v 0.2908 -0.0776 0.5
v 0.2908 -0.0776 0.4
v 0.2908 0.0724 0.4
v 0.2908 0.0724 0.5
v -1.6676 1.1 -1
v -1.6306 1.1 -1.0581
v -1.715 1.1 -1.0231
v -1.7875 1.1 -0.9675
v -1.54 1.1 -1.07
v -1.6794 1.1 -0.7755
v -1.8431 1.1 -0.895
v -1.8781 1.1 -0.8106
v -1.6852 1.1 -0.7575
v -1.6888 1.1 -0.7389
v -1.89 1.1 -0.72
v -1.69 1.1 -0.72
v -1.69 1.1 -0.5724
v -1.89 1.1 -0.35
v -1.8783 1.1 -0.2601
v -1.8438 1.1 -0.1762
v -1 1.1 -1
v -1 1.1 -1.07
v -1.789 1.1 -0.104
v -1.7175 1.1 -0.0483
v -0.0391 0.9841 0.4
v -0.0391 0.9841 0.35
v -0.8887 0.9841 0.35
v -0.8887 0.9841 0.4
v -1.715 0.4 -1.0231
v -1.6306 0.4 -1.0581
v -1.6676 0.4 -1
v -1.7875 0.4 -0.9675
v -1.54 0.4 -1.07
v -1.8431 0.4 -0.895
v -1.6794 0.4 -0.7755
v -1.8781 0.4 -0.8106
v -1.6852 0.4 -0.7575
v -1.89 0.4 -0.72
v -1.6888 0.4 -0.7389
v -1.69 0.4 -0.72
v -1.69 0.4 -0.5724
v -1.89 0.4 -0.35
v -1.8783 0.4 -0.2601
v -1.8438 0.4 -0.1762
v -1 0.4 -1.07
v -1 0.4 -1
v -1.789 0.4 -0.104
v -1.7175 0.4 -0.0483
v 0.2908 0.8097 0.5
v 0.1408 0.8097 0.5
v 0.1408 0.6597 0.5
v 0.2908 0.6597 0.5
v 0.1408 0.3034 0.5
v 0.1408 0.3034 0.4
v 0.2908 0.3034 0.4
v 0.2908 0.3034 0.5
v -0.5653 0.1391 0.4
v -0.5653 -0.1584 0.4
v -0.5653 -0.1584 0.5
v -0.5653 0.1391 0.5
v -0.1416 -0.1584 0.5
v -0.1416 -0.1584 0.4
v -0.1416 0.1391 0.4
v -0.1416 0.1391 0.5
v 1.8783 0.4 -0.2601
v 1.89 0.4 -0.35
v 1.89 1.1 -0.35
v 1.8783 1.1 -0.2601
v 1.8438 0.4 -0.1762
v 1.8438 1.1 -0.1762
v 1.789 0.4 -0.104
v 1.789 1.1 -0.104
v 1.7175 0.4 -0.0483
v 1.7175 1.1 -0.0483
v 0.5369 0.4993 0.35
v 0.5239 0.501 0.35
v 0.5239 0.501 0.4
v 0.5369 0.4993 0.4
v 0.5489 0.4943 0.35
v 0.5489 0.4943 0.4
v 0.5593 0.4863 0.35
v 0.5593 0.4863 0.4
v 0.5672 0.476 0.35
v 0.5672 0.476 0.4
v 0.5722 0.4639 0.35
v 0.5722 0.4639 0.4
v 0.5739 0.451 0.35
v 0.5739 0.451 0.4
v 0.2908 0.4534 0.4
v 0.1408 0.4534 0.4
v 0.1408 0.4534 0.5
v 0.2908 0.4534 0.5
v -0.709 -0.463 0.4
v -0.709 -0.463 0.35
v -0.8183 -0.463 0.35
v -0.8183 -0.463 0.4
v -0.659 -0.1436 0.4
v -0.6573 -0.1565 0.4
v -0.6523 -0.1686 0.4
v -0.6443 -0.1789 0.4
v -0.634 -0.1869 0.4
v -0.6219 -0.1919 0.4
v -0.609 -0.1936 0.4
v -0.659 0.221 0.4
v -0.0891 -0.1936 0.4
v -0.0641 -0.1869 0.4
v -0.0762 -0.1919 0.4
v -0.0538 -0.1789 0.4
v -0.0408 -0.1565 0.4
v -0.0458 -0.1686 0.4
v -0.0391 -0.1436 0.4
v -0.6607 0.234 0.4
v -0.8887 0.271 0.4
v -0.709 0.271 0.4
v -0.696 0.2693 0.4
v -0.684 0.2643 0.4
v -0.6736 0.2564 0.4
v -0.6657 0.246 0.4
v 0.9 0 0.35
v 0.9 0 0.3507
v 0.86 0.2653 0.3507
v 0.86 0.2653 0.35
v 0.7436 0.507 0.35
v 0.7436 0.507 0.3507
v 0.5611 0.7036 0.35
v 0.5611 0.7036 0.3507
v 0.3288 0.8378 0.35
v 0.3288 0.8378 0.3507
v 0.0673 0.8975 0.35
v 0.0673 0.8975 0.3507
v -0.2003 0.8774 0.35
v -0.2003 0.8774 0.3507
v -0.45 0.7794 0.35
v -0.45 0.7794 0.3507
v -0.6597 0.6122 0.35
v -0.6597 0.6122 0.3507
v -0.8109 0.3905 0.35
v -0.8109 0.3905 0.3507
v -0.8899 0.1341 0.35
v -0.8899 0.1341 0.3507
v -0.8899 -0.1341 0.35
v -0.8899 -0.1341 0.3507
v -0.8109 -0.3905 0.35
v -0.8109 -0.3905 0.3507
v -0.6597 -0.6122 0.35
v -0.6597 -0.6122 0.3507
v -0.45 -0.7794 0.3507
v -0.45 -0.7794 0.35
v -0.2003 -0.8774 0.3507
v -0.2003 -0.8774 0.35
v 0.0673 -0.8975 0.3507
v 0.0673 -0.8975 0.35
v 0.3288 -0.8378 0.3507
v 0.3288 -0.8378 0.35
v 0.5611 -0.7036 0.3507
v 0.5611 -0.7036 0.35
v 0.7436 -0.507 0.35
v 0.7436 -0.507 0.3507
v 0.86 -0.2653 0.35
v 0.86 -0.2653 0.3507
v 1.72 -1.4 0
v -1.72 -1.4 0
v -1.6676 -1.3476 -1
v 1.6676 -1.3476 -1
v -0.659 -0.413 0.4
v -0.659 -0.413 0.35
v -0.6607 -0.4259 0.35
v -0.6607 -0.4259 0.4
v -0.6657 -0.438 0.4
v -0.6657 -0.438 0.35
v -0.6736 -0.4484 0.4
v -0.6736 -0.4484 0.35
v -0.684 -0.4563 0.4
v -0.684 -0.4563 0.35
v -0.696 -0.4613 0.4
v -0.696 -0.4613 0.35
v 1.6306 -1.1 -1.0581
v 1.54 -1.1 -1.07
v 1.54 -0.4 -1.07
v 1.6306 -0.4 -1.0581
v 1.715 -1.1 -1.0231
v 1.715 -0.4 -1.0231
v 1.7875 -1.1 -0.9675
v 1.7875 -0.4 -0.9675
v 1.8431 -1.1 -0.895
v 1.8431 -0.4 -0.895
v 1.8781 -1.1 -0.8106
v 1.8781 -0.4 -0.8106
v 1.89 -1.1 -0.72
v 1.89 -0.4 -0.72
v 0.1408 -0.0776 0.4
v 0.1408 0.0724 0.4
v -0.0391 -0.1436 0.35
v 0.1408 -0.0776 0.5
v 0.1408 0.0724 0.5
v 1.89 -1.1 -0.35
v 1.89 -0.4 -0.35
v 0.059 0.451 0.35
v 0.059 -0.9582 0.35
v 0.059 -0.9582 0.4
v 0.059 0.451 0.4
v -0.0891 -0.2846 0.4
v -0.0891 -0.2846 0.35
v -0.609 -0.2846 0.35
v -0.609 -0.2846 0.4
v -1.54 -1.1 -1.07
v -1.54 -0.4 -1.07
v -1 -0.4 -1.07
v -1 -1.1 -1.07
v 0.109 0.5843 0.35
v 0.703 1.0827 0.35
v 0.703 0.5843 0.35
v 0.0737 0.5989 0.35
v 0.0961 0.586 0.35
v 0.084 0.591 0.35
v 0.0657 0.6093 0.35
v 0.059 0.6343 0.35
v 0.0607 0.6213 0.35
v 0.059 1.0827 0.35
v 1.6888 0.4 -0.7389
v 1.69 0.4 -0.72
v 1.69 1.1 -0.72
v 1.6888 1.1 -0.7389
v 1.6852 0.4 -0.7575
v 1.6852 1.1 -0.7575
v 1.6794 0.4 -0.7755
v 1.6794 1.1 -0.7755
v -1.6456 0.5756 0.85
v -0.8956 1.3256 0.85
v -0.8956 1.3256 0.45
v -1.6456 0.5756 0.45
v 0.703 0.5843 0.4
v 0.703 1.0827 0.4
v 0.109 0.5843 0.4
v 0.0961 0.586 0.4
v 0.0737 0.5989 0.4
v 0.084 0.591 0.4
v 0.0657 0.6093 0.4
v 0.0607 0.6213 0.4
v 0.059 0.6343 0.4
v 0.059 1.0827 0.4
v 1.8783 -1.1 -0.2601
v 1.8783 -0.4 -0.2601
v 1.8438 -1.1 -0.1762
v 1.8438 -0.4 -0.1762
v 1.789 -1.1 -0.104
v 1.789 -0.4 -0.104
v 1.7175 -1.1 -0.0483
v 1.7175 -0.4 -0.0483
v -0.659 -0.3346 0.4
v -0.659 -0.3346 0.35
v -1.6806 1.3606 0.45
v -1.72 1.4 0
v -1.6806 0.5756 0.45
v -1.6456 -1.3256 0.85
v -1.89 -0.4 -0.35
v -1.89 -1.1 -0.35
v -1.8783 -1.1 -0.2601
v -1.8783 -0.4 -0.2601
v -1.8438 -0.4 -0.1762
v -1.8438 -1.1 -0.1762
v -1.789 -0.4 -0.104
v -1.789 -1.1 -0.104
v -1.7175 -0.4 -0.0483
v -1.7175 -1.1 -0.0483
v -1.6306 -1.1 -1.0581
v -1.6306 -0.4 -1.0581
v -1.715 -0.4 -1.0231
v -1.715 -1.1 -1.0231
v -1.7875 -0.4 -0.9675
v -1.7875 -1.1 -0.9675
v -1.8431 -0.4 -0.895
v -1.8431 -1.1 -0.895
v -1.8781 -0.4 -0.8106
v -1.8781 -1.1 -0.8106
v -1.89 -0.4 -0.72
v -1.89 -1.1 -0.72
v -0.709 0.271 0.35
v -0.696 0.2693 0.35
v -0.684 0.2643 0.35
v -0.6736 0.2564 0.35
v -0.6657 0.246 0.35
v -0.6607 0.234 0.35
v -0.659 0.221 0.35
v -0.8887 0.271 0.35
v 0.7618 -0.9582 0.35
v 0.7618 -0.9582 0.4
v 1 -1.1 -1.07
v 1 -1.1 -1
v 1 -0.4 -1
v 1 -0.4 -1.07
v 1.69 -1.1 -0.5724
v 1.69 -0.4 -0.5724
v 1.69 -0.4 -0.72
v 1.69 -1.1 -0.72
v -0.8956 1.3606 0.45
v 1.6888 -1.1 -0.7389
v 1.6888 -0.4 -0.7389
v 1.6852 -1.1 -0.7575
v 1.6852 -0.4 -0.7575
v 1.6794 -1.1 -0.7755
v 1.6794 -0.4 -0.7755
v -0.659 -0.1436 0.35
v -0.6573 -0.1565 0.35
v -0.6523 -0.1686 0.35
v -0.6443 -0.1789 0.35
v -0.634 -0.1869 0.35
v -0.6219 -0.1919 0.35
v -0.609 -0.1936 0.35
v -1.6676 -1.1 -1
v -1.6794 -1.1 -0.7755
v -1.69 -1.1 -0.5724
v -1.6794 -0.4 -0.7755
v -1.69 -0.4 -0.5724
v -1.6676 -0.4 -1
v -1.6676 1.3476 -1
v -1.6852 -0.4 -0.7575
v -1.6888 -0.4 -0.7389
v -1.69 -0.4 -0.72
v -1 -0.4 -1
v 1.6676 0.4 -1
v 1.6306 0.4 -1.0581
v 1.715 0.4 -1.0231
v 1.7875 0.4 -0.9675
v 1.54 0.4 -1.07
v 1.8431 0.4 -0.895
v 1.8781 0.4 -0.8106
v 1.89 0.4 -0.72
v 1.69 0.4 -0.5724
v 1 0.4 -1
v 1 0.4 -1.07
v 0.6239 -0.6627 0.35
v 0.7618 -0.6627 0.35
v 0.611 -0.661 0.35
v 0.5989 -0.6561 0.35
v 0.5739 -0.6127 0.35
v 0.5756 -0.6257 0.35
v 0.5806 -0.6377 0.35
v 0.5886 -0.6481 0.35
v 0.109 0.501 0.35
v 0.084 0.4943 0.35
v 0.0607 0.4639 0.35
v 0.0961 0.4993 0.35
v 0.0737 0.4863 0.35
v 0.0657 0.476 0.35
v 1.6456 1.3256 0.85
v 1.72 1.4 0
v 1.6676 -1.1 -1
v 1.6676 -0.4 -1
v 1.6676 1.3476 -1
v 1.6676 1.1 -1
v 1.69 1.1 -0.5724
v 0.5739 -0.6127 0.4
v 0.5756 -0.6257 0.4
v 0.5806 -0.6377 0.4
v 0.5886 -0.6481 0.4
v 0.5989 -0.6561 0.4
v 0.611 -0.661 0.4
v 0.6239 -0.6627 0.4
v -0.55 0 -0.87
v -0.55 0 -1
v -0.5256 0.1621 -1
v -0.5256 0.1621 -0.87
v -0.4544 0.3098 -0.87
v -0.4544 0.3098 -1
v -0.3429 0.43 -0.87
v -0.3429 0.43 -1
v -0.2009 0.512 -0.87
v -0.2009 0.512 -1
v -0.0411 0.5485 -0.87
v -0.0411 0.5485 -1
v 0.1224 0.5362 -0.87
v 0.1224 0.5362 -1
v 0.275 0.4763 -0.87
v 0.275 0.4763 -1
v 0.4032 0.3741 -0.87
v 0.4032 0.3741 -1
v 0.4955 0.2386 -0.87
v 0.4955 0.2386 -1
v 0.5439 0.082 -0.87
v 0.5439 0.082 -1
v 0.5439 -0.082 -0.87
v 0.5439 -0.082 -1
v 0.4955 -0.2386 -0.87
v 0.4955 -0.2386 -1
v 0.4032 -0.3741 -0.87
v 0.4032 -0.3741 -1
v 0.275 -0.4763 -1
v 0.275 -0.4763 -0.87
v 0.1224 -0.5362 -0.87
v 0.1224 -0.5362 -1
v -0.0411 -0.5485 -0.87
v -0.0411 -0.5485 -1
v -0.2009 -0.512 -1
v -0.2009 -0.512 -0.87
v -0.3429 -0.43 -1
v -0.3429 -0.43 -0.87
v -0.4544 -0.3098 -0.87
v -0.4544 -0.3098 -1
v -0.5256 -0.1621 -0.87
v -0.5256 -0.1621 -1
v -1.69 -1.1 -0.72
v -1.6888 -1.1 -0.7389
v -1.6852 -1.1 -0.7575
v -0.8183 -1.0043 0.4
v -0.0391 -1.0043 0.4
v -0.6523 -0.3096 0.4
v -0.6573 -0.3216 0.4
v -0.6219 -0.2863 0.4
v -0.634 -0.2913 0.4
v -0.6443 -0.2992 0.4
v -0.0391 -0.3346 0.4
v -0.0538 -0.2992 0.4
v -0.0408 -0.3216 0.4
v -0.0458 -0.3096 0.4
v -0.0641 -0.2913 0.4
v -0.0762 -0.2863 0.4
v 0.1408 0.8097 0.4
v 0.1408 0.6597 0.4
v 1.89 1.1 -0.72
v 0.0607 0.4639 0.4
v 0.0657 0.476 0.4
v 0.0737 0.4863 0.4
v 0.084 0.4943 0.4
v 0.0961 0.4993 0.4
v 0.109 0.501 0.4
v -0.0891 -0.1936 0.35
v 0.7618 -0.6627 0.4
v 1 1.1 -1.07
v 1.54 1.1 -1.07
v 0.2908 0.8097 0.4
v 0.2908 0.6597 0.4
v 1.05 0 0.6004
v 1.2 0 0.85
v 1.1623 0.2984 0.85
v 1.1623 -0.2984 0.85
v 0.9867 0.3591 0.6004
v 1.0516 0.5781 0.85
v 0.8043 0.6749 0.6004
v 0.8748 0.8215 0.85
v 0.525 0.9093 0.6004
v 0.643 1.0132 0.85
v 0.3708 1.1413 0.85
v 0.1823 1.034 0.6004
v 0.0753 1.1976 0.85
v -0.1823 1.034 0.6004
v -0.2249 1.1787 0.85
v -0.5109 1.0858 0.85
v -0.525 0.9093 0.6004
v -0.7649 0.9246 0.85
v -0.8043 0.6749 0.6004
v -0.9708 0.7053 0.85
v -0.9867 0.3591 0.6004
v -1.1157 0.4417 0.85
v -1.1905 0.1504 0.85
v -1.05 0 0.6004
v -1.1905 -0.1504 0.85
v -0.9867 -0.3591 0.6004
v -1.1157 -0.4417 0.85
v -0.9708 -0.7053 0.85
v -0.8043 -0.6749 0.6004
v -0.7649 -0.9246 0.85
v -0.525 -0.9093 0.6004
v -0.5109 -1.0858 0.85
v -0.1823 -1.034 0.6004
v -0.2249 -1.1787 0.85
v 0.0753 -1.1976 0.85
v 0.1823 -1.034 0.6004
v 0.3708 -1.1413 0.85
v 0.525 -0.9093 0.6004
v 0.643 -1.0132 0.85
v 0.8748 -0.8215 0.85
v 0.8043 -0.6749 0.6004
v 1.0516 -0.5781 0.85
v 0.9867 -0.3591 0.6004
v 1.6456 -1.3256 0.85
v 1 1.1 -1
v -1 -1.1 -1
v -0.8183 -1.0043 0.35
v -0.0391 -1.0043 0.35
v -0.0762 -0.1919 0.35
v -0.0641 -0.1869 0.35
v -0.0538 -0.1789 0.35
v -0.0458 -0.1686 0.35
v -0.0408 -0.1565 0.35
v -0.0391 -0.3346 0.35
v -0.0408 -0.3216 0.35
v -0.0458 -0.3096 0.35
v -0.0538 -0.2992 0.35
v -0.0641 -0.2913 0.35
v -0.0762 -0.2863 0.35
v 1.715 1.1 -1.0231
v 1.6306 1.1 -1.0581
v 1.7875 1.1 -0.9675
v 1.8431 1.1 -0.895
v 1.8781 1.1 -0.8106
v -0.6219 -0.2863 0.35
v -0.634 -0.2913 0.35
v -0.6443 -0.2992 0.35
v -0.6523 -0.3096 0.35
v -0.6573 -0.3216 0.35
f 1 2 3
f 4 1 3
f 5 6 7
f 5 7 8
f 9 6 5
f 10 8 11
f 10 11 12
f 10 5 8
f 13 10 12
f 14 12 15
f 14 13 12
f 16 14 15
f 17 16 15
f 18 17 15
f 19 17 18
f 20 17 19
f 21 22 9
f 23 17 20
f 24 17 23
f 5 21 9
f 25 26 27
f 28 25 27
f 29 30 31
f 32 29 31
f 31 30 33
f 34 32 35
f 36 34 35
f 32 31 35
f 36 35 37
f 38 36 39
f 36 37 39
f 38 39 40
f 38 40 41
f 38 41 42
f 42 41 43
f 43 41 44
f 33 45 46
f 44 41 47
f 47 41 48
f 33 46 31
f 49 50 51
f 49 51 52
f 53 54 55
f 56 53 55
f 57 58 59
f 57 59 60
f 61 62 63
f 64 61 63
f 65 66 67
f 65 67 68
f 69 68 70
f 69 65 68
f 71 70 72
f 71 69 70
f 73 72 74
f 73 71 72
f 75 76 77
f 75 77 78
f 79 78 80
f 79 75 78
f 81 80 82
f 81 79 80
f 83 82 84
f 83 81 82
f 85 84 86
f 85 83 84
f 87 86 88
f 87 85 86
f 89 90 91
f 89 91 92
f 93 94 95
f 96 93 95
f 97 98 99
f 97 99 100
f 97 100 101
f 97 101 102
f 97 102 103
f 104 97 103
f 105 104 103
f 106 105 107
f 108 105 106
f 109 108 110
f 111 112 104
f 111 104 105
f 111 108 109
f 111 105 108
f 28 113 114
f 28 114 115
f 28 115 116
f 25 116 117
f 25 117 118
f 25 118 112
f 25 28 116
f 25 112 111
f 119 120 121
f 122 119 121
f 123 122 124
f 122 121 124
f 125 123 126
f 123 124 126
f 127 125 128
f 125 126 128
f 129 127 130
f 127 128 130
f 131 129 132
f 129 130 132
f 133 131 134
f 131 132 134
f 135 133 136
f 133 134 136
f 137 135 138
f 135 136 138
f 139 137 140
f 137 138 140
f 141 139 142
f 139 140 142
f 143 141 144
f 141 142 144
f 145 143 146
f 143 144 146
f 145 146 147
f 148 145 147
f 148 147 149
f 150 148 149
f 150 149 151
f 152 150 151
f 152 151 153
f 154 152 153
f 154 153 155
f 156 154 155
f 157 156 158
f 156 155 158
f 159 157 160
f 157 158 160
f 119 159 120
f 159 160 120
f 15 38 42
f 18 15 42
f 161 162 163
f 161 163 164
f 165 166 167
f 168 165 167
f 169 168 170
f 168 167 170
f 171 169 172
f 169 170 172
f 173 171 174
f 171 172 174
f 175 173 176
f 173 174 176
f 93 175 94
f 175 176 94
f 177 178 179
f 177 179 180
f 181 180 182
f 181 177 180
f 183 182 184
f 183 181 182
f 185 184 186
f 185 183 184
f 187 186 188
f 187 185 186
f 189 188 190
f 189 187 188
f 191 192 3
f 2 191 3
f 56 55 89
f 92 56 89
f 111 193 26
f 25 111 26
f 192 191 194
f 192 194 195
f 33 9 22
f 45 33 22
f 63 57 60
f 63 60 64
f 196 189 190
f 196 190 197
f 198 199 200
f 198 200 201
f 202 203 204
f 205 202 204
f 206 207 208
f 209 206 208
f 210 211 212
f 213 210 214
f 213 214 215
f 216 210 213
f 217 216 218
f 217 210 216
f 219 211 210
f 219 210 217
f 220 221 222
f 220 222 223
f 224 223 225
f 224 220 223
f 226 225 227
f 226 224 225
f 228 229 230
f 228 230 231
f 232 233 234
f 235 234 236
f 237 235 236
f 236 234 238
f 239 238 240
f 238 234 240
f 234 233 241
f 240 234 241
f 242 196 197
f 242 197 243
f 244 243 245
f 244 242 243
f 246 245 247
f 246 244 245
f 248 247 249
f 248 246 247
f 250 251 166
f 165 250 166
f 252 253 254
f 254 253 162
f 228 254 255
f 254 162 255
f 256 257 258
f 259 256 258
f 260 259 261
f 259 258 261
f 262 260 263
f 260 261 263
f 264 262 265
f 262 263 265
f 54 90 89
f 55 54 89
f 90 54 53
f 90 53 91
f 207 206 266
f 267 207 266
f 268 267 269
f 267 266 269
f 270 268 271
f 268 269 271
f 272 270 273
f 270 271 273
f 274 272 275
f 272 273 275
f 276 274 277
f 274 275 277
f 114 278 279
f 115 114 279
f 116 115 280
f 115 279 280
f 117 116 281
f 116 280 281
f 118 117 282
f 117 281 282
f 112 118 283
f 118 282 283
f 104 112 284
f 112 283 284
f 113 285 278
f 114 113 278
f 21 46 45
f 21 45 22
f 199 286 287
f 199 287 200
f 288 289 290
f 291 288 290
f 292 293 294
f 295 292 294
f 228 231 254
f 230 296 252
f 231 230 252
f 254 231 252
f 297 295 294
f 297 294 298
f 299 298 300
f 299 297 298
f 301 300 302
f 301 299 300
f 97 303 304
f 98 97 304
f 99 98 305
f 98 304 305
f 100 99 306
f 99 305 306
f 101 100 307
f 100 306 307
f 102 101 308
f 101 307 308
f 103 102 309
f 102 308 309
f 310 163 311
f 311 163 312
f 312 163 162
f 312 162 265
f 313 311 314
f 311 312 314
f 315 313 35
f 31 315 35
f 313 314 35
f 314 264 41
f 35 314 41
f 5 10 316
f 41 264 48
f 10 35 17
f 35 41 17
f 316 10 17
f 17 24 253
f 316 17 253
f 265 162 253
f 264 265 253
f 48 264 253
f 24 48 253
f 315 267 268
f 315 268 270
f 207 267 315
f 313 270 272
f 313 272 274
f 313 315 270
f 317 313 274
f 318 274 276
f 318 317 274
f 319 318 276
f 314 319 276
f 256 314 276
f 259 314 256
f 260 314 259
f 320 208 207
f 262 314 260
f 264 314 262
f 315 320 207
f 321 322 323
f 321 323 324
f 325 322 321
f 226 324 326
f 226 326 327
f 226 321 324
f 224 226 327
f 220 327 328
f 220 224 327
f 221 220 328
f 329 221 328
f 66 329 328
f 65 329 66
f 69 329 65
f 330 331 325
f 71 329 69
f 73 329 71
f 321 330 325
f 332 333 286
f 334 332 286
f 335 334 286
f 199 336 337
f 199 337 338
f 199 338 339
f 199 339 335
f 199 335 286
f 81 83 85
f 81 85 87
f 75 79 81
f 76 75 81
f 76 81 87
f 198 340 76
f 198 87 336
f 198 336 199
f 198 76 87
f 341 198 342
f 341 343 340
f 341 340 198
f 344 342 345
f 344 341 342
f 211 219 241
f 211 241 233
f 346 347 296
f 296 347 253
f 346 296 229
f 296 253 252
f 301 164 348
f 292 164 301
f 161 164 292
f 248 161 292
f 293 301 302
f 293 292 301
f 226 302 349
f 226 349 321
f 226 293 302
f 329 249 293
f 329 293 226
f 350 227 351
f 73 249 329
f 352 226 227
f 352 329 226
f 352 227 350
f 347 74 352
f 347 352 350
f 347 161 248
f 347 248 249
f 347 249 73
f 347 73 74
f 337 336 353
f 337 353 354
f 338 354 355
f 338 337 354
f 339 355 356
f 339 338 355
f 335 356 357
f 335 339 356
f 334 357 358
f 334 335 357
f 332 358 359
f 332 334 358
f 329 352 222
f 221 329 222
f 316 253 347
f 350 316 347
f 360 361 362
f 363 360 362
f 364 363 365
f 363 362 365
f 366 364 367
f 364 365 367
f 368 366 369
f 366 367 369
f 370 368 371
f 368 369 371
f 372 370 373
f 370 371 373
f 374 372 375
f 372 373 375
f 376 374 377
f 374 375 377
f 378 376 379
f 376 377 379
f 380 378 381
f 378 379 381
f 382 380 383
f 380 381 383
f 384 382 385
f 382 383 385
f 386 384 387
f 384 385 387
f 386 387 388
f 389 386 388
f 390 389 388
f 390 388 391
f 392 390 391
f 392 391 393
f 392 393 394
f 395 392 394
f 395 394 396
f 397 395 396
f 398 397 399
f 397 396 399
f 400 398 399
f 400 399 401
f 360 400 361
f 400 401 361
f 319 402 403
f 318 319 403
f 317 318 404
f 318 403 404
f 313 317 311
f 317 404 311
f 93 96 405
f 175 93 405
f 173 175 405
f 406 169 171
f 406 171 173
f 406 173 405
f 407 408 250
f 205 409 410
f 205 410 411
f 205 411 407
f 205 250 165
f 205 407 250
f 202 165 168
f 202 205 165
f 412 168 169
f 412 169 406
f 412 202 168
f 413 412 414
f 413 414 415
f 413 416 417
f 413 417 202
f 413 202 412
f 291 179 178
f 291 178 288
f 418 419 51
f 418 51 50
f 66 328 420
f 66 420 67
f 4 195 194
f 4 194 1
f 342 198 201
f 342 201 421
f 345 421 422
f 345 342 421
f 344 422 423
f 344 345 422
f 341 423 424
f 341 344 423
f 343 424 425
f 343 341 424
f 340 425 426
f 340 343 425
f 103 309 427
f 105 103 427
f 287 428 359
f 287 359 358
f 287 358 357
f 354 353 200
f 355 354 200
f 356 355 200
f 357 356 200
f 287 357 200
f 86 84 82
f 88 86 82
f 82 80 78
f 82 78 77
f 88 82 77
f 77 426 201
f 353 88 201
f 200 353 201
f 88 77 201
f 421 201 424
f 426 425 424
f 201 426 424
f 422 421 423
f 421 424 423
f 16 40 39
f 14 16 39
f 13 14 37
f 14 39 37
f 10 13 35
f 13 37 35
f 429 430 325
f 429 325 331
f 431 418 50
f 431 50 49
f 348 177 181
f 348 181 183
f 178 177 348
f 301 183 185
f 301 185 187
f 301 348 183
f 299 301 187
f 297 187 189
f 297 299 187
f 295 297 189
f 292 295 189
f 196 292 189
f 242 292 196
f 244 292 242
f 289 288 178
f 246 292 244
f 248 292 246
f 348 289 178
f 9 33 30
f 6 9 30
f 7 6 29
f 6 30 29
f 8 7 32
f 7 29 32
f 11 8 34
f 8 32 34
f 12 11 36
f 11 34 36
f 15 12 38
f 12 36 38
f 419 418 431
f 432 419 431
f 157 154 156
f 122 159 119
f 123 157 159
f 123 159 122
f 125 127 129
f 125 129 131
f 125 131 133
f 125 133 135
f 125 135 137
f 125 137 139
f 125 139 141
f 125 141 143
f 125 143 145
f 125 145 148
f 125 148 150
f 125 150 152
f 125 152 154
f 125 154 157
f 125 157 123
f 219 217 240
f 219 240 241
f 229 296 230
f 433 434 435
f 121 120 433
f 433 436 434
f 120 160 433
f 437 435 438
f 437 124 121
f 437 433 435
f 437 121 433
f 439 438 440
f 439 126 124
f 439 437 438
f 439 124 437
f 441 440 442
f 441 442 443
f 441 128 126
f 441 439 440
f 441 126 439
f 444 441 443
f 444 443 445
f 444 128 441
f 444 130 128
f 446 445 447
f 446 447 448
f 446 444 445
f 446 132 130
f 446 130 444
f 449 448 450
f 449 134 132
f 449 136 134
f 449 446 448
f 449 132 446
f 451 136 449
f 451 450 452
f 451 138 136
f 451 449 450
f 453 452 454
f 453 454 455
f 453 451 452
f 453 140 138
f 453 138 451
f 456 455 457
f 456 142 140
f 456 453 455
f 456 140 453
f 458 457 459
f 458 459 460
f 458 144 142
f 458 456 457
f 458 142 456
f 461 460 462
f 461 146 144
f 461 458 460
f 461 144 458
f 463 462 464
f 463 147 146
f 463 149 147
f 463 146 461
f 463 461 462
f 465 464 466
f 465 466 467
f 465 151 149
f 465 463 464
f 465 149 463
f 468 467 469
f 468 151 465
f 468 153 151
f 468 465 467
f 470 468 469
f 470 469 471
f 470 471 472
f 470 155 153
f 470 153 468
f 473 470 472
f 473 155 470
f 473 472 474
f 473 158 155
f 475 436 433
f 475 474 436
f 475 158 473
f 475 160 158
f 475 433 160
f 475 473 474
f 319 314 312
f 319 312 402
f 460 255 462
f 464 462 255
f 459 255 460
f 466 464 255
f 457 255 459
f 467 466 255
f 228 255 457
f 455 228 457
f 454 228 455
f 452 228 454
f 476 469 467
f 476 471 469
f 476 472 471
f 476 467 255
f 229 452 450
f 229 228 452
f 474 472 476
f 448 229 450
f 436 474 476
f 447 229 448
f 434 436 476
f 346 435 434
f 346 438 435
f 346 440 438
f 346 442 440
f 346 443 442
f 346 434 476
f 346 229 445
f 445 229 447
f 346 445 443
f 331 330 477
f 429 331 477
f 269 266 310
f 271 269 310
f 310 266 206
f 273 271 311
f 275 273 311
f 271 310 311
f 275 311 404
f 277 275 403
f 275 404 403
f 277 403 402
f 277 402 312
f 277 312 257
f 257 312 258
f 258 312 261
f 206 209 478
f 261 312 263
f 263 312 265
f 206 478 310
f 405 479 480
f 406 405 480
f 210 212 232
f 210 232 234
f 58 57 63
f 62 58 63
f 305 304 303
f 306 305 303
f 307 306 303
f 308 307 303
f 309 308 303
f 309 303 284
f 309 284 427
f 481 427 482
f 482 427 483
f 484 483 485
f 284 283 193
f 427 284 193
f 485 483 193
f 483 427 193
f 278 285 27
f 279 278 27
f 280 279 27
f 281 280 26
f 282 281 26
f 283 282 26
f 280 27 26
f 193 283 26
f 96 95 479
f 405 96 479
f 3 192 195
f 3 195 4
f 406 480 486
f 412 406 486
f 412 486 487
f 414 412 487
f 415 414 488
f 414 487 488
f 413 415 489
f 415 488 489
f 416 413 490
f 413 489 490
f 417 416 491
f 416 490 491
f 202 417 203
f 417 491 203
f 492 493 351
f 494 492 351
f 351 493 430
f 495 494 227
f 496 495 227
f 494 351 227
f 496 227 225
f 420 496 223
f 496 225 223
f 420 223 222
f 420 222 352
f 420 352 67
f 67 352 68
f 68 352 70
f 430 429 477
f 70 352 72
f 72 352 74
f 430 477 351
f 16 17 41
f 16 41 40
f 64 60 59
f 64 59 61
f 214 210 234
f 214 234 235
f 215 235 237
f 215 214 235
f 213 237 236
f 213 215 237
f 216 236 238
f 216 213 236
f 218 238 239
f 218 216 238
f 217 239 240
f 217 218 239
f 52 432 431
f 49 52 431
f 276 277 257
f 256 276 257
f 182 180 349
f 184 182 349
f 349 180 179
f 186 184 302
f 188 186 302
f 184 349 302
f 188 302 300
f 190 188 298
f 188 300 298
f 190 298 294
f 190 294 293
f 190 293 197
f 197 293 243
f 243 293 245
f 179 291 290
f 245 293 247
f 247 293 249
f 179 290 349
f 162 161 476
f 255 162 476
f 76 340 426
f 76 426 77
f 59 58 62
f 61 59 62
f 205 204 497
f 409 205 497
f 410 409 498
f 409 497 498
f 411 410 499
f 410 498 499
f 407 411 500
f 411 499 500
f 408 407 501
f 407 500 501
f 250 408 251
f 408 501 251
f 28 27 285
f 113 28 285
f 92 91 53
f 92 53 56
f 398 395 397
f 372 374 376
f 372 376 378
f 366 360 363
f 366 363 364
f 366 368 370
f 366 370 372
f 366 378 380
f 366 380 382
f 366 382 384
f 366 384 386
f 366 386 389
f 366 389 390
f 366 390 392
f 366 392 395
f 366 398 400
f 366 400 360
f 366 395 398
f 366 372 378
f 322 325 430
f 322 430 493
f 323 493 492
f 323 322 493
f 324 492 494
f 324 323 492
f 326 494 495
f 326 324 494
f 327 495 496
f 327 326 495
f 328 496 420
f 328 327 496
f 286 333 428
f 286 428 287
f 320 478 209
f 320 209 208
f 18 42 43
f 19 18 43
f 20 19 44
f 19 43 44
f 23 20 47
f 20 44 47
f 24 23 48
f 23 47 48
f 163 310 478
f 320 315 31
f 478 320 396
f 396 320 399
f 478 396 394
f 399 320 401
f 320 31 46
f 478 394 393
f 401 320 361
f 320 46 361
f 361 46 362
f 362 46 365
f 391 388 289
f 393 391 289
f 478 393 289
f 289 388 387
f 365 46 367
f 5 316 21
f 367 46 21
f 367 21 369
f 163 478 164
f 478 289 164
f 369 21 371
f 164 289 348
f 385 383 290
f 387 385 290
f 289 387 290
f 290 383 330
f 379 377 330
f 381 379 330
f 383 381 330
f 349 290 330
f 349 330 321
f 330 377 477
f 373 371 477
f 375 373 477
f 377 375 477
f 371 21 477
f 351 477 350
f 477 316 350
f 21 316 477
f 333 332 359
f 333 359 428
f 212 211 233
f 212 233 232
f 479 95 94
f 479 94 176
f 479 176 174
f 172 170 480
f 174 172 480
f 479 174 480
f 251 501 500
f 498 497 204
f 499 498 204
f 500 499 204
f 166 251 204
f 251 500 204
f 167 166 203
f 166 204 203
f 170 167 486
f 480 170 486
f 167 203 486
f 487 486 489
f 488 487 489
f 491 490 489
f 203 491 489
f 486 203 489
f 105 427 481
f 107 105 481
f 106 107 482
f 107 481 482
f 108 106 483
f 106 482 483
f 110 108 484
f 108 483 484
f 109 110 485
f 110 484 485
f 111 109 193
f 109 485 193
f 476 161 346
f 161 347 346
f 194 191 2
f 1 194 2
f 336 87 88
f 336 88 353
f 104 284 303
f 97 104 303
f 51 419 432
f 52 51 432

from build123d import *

# Parameters (mm, degrees)
SKETCH_1_W                       = 3.44
SKETCH_1_H                       = 2.8
EXTRUDE_1_DEPTH                  = 1
EXTRUDE_1_DRAFT                  = -3
SKETCH_3_R                       = 0.55
SKETCH_3_W                       = 0.667592221
SKETCH_3_H                       = 0.7
CUT_EXTRUDE_1_DEPTH              = 0.13
SKETCH_5_W                       = 0.69
SKETCH_5_H                       = 0.7
SM_BASE_FLANGE_1_DEPTH           = 0.2
SM_EDGE_FLANGE_1_STRIP_W         = 1.1
SM_EDGE_FLANGE_1_STRIP_H         = 0.2
SM_EDGE_FLANGE_1_STRIP_CUT_DEPTH = 0.7
SM_EDGE_FLANGE_1_DEPTH           = 0.7
SM_EDGE_FLANGE_2_STRIP_W         = 1.1
SM_EDGE_FLANGE_2_STRIP_H         = 0.2
SM_EDGE_FLANGE_2_STRIP_CUT_DEPTH = 0.7
SM_EDGE_FLANGE_2_DEPTH           = 0.7
PATTERN_LINEAR_1_COUNT           = 2
PATTERN_LINEAR_1_PITCH           = 1.5
SKETCH_30_W                      = 3.44
SKETCH_30_H                      = 2.8
EXTRUDE_3_DEPTH                  = 0.85
EXTRUDE_3_TAPER                  = 5
CUT_EXTRUDE_2_DEPTH              = 0.4
SKETCH_34_R                      = 0.9
CUT_EXTRUDE_3_DEPTH              = 0.5
CHAMFER_1_SIZE                   = 0.3
CHAMFER_1_SIZE2                  = 0.499283845
EXTRUDE_4_DEPTH                  = 0.05
EXTRUDE_4_2_DEPTH                = 0.05
EXTRUDE_4_3_DEPTH                = 0.05
EXTRUDE_4_4_DEPTH                = 0.05
SKETCH_49_W                      = 0.423711769
SKETCH_49_H                      = 0.297484251
EXTRUDE_5_DEPTH                  = 0.1
SKETCH_49_W_2                    = 0.15
SKETCH_49_H_2                    = 0.15
EXTRUDE_5_2_DEPTH                = 0.1
EXTRUDE_5_3_DEPTH                = 0.1
EXTRUDE_5_4_DEPTH                = 0.1


# Sheet-metal steps are written as plain solids
with BuildPart() as part:
    # Sketch 1 → Бобышка-Вытянуть1 (with draft: the straight prism first)
    with BuildSketch(Plane.XY):
        Rectangle(SKETCH_1_W, SKETCH_1_H)
    extrude(amount=-EXTRUDE_1_DEPTH)
    # Бобышка-Вытянуть1: the draft: its side faces are tilted about the plane it starts from
    extrude_1_sides = [part.faces().sort_by_distance(p)[0] for p in [
        (-1.72, 0, -0.5),
        (0, -1.4, -0.5),
        (1.72, 0, -0.5),
        (0, 1.4, -0.5),
    ]]
    draft(extrude_1_sides, Plane.XY, EXTRUDE_1_DRAFT)

    # Sketch 3 → Вырез-Вытянуть1 (cut)
    with BuildSketch(Plane(origin=(0, 0, -1), x_dir=(-1, 0, 0), z_dir=(0, 0, -1))):
        Circle(SKETCH_3_R)
        with Locations((-1.333796111, 0.75)):
            Rectangle(SKETCH_3_W, SKETCH_3_H)
        with Locations((1.333796111, 0.75)):
            Rectangle(SKETCH_3_W, SKETCH_3_H)
        with Locations((-1.333796111, -0.75)):
            Rectangle(SKETCH_3_W, SKETCH_3_H)
        with Locations((1.333796111, -0.75)):
            Rectangle(SKETCH_3_W, SKETCH_3_H)
    extrude(amount=-CUT_EXTRUDE_1_DEPTH, mode=Mode.SUBTRACT)



with BuildPart() as body_2:
    # Sketch 5 → Базовая кромка1 (new body)
    with BuildSketch(Plane(origin=(0, 0, -0.87), x_dir=(-1, 0, 0), z_dir=(0, 0, -1))):
        with Locations((-1.345, 0.75)):
            Rectangle(SKETCH_5_W, SKETCH_5_H)
    extrude(amount=SM_BASE_FLANGE_1_DEPTH)

    # Ребро-кромка1 strip (across the edge) → Ребро-кромка1 strip cut (cut)
    with BuildSketch(Plane(origin=(1.69, 0.4, -0.87), x_dir=(-1, 0, 0), z_dir=(0, 1, 0))):
        with Locations((-0.4, -0.1)):
            Rectangle(SM_EDGE_FLANGE_1_STRIP_W, SM_EDGE_FLANGE_1_STRIP_H)
    extrude(amount=SM_EDGE_FLANGE_1_STRIP_CUT_DEPTH, mode=Mode.SUBTRACT)

    # Ребро-кромка1 section (across the edge) → Ребро-кромка1 (add)
    with BuildSketch(Plane(origin=(1.69, 0.4, -0.87), x_dir=(-1, 0, 0), z_dir=(0, 1, 0))):
        with BuildLine():
            Line((-0.2, 0.15), (-0.2, 0.87))
            Line((-0.2, 0.87), (0, 0.87))
            Line((0, 0.87), (0, 0.15))
            ThreePointArc((0, 0.15), (0.043933983, 0.043933983), (0.15, 0))
            Line((0.15, 0), (0.15, -0.2))
            ThreePointArc((0.15, -0.2), (-0.097487373, -0.097487373), (-0.2, 0.15))
        make_face()
    extrude(amount=SM_EDGE_FLANGE_1_DEPTH)

    # Ребро-кромка2 strip (across the edge) → Ребро-кромка2 strip cut (cut)
    with BuildSketch(Plane(origin=(1.69, 0.4, 0), x_dir=(0, 0, -1), z_dir=(0, 1, 0))):
        with Locations((-0.2, -0.1)):
            Rectangle(SM_EDGE_FLANGE_2_STRIP_W, SM_EDGE_FLANGE_2_STRIP_H)
    extrude(amount=SM_EDGE_FLANGE_2_STRIP_CUT_DEPTH, mode=Mode.SUBTRACT)

    # Ребро-кромка2 section (across the edge) → Ребро-кромка2 (add)
    with BuildSketch(Plane(origin=(1.69, 0.4, 0), x_dir=(0, 0, -1), z_dir=(0, 1, 0))):
        with BuildLine():
            Line((0, 0.15), (0, 0.4))
            Line((0, 0.4), (0.2, 0.4))
            Line((0.2, 0.4), (0.2, 0.15))
            ThreePointArc((0.2, 0.15), (0.243933983, 0.043933983), (0.35, 0))
            Line((0.35, 0), (0.35, -0.2))
            ThreePointArc((0.35, -0.2), (0.102512627, -0.097487373), (0, 0.15))
        make_face()
    extrude(amount=SM_EDGE_FLANGE_2_DEPTH)


with BuildPart() as pattern_linear_1_1:
    # Линейный массив1: pattern copy
    add(body_2.part.moved(Location(Vector(0, -1, 0) * (1 * PATTERN_LINEAR_1_PITCH))))


with BuildPart() as body_4:
    # Зеркальное отражение1: mirrored copy
    add(body_2.part.mirror(Plane(origin=(0, 0, 0), x_dir=(0, 0, 1), z_dir=(1, 0, 0))))


with BuildPart() as body_5:
    # Mirror 1 2: mirrored copy
    add(pattern_linear_1_1.part.mirror(Plane(origin=(0, 0, 0), x_dir=(0, 0, 1), z_dir=(1, 0, 0))))


with BuildPart() as part_1:
    add(part.part)

    add(body_2.part)  # Бобышка-Вытянуть3 merges body 2

    add(pattern_linear_1_1.part)  # Бобышка-Вытянуть3 merges Линейный массив1_1

    add(body_4.part)  # Бобышка-Вытянуть3 merges body 4

    add(body_5.part)  # Бобышка-Вытянуть3 merges body 5
    # Эскиз30 → Бобышка-Вытянуть3 (add)
    with BuildSketch(Plane.XY):
        Rectangle(SKETCH_30_W, SKETCH_30_H)
    extrude(amount=EXTRUDE_3_DEPTH, taper=EXTRUDE_3_TAPER)

    # Эскиз33 → Вырез-Вытянуть2 (cut)
    with BuildSketch(Plane.XY.offset(0.85)):
        Polygon((-0.895634636, 1.325634636), (-1.645634636, 0.575634636), (-2.879687624, 0.575634636), (-2.879687624, 2.879687624), (-0.895634636, 2.879687624), align=None)
    extrude(amount=-CUT_EXTRUDE_2_DEPTH, mode=Mode.SUBTRACT)

    # Эскиз34 → Вырез-Вытянуть3 (cut)
    with BuildSketch(Plane.XY.offset(0.85)):
        Circle(SKETCH_34_R)
    extrude(amount=-CUT_EXTRUDE_3_DEPTH, mode=Mode.SUBTRACT)

    # Фаска1
    chamfer_1_edges = [part_1.edges().sort_by_distance(p)[0] for p in [
        (-0.9, 0, 0.85),
    ]]
    chamfer_1_side = [part_1.faces().sort_by_distance(p)[0] for p in [
        (0, -1.283371553, 0.85),
    ]]
    chamfer(chamfer_1_edges, length=CHAMFER_1_SIZE, length2=CHAMFER_1_SIZE2, reference=chamfer_1_side[0])


with BuildPart() as body_2_2:
    # Эскиз48 → Бобышка-Вытянуть4 (new body)
    with BuildSketch(Plane.XY.offset(0.35)):
        with BuildLine():
            Line((0.059009947, -0.958170677), (0.059009947, 0.45096966))
            ThreePointArc((0.059009947, 0.45096966), (0.073654608, 0.486324999), (0.109009947, 0.50096966))
            Line((0.109009947, 0.50096966), (0.523920369, 0.50096966))
            ThreePointArc((0.523920369, 0.50096966), (0.559275708, 0.486324999), (0.573920369, 0.45096966))
            Line((0.573920369, 0.45096966), (0.573920369, -0.612749155))
            ThreePointArc((0.573920369, -0.612749155), (0.58856503, -0.648104494), (0.623920369, -0.662749155))
            Line((0.623920369, -0.662749155), (0.761798951, -0.662749155))
            Line((0.761798951, -0.662749155), (0.761798951, -0.958170677))
            Line((0.761798951, -0.958170677), (0.059009947, -0.958170677))
        make_face()
    extrude(amount=EXTRUDE_4_DEPTH)


with BuildPart() as body_3:
    # Эскиз48 → Extrude 4 2 (new body)
    with BuildSketch(Plane.XY.offset(0.35)):
        with BuildLine():
            Line((0.059009947, 1.082676661), (0.702963992, 1.082676661))
            Line((0.702963992, 1.082676661), (0.702963992, 0.584256601))
            Line((0.702963992, 0.584256601), (0.109009947, 0.584256601))
            ThreePointArc((0.109009947, 0.584256601), (0.073654608, 0.598901262), (0.059009947, 0.634256601))
            Line((0.059009947, 0.634256601), (0.059009947, 1.082676661))
        make_face()
    extrude(amount=EXTRUDE_4_2_DEPTH)


with BuildPart() as body_4_2:
    # Эскиз48 → Extrude 4 3 (new body)
    with BuildSketch(Plane.XY.offset(0.35)):
        with BuildLine():
            Line((-0.039130176, -1.004290426), (-0.039130176, -0.334579702))
            ThreePointArc((-0.039130176, -0.334579702), (-0.053774837, -0.299224363), (-0.089130176, -0.284579702))
            Line((-0.089130176, -0.284579702), (-0.608977855, -0.284579702))
            ThreePointArc((-0.608977855, -0.284579702), (-0.644333194, -0.299224363), (-0.658977855, -0.334579702))
            Line((-0.658977855, -0.334579702), (-0.658977855, -0.413006558))
            ThreePointArc((-0.658977855, -0.413006558), (-0.673622516, -0.448361897), (-0.708977855, -0.463006558))
            Line((-0.708977855, -0.463006558), (-0.818312154, -0.463006558))
            Line((-0.818312154, -0.463006558), (-0.818312154, -1.004290426))
            Line((-0.818312154, -1.004290426), (-0.039130176, -1.004290426))
        make_face()
    extrude(amount=EXTRUDE_4_3_DEPTH)


with BuildPart() as body_5_2:
    # Эскиз48 → Extrude 4 4 (new body)
    with BuildSketch(Plane.XY.offset(0.35)):
        with BuildLine():
            Line((-0.039130176, 0.984110402), (-0.888741187, 0.984110402))
            Line((-0.888741187, 0.984110402), (-0.888741187, 0.271021616))
            Line((-0.888741187, 0.271021616), (-0.708977855, 0.271021616))
            ThreePointArc((-0.708977855, 0.271021616), (-0.673622516, 0.256376955), (-0.658977855, 0.221021616))
            Line((-0.658977855, 0.221021616), (-0.658977855, -0.143579013))
            ThreePointArc((-0.658977855, -0.143579013), (-0.644333194, -0.178934352), (-0.608977855, -0.193579013))
            Line((-0.608977855, -0.193579013), (-0.089130176, -0.193579013))
            ThreePointArc((-0.089130176, -0.193579013), (-0.053774837, -0.178934352), (-0.039130176, -0.143579013))
            Line((-0.039130176, -0.143579013), (-0.039130176, 0.984110402))
        make_face()
    extrude(amount=EXTRUDE_4_4_DEPTH)


with BuildPart() as body_6:
    # Эскиз49 → Бобышка-Вытянуть5 (new body)
    with BuildSketch(Plane.XY.offset(0.4)):
        with Locations((-0.353441563, -0.009663473)):
            Rectangle(SKETCH_49_W, SKETCH_49_H)
    extrude(amount=EXTRUDE_5_DEPTH)


with BuildPart() as body_7:
    # Эскиз49 → Extrude 5 2 (new body)
    with BuildSketch(Plane.XY.offset(0.4)):
        with Locations((0.215810569, 0.734743971)):
            Rectangle(SKETCH_49_W_2, SKETCH_49_H_2)
    extrude(amount=EXTRUDE_5_2_DEPTH)


with BuildPart() as body_8:
    # Эскиз49 → Extrude 5 3 (new body)
    with BuildSketch(Plane.XY.offset(0.4)):
        with Locations((0.215810569, 0.378392896)):
            Rectangle(SKETCH_49_W_2, SKETCH_49_H_2)
    extrude(amount=EXTRUDE_5_3_DEPTH)


with BuildPart() as body_9:
    # Эскиз49 → Extrude 5 4 (new body)
    with BuildSketch(Plane.XY.offset(0.4)):
        with Locations((0.215810569, -0.002583161)):
            Rectangle(SKETCH_49_W_2, SKETCH_49_H_2)
    extrude(amount=EXTRUDE_5_4_DEPTH)


solid = Compound([part_1.part, body_2_2.part, body_3.part, body_4_2.part, body_5_2.part, body_6.part, body_7.part, body_8.part, body_9.part])
